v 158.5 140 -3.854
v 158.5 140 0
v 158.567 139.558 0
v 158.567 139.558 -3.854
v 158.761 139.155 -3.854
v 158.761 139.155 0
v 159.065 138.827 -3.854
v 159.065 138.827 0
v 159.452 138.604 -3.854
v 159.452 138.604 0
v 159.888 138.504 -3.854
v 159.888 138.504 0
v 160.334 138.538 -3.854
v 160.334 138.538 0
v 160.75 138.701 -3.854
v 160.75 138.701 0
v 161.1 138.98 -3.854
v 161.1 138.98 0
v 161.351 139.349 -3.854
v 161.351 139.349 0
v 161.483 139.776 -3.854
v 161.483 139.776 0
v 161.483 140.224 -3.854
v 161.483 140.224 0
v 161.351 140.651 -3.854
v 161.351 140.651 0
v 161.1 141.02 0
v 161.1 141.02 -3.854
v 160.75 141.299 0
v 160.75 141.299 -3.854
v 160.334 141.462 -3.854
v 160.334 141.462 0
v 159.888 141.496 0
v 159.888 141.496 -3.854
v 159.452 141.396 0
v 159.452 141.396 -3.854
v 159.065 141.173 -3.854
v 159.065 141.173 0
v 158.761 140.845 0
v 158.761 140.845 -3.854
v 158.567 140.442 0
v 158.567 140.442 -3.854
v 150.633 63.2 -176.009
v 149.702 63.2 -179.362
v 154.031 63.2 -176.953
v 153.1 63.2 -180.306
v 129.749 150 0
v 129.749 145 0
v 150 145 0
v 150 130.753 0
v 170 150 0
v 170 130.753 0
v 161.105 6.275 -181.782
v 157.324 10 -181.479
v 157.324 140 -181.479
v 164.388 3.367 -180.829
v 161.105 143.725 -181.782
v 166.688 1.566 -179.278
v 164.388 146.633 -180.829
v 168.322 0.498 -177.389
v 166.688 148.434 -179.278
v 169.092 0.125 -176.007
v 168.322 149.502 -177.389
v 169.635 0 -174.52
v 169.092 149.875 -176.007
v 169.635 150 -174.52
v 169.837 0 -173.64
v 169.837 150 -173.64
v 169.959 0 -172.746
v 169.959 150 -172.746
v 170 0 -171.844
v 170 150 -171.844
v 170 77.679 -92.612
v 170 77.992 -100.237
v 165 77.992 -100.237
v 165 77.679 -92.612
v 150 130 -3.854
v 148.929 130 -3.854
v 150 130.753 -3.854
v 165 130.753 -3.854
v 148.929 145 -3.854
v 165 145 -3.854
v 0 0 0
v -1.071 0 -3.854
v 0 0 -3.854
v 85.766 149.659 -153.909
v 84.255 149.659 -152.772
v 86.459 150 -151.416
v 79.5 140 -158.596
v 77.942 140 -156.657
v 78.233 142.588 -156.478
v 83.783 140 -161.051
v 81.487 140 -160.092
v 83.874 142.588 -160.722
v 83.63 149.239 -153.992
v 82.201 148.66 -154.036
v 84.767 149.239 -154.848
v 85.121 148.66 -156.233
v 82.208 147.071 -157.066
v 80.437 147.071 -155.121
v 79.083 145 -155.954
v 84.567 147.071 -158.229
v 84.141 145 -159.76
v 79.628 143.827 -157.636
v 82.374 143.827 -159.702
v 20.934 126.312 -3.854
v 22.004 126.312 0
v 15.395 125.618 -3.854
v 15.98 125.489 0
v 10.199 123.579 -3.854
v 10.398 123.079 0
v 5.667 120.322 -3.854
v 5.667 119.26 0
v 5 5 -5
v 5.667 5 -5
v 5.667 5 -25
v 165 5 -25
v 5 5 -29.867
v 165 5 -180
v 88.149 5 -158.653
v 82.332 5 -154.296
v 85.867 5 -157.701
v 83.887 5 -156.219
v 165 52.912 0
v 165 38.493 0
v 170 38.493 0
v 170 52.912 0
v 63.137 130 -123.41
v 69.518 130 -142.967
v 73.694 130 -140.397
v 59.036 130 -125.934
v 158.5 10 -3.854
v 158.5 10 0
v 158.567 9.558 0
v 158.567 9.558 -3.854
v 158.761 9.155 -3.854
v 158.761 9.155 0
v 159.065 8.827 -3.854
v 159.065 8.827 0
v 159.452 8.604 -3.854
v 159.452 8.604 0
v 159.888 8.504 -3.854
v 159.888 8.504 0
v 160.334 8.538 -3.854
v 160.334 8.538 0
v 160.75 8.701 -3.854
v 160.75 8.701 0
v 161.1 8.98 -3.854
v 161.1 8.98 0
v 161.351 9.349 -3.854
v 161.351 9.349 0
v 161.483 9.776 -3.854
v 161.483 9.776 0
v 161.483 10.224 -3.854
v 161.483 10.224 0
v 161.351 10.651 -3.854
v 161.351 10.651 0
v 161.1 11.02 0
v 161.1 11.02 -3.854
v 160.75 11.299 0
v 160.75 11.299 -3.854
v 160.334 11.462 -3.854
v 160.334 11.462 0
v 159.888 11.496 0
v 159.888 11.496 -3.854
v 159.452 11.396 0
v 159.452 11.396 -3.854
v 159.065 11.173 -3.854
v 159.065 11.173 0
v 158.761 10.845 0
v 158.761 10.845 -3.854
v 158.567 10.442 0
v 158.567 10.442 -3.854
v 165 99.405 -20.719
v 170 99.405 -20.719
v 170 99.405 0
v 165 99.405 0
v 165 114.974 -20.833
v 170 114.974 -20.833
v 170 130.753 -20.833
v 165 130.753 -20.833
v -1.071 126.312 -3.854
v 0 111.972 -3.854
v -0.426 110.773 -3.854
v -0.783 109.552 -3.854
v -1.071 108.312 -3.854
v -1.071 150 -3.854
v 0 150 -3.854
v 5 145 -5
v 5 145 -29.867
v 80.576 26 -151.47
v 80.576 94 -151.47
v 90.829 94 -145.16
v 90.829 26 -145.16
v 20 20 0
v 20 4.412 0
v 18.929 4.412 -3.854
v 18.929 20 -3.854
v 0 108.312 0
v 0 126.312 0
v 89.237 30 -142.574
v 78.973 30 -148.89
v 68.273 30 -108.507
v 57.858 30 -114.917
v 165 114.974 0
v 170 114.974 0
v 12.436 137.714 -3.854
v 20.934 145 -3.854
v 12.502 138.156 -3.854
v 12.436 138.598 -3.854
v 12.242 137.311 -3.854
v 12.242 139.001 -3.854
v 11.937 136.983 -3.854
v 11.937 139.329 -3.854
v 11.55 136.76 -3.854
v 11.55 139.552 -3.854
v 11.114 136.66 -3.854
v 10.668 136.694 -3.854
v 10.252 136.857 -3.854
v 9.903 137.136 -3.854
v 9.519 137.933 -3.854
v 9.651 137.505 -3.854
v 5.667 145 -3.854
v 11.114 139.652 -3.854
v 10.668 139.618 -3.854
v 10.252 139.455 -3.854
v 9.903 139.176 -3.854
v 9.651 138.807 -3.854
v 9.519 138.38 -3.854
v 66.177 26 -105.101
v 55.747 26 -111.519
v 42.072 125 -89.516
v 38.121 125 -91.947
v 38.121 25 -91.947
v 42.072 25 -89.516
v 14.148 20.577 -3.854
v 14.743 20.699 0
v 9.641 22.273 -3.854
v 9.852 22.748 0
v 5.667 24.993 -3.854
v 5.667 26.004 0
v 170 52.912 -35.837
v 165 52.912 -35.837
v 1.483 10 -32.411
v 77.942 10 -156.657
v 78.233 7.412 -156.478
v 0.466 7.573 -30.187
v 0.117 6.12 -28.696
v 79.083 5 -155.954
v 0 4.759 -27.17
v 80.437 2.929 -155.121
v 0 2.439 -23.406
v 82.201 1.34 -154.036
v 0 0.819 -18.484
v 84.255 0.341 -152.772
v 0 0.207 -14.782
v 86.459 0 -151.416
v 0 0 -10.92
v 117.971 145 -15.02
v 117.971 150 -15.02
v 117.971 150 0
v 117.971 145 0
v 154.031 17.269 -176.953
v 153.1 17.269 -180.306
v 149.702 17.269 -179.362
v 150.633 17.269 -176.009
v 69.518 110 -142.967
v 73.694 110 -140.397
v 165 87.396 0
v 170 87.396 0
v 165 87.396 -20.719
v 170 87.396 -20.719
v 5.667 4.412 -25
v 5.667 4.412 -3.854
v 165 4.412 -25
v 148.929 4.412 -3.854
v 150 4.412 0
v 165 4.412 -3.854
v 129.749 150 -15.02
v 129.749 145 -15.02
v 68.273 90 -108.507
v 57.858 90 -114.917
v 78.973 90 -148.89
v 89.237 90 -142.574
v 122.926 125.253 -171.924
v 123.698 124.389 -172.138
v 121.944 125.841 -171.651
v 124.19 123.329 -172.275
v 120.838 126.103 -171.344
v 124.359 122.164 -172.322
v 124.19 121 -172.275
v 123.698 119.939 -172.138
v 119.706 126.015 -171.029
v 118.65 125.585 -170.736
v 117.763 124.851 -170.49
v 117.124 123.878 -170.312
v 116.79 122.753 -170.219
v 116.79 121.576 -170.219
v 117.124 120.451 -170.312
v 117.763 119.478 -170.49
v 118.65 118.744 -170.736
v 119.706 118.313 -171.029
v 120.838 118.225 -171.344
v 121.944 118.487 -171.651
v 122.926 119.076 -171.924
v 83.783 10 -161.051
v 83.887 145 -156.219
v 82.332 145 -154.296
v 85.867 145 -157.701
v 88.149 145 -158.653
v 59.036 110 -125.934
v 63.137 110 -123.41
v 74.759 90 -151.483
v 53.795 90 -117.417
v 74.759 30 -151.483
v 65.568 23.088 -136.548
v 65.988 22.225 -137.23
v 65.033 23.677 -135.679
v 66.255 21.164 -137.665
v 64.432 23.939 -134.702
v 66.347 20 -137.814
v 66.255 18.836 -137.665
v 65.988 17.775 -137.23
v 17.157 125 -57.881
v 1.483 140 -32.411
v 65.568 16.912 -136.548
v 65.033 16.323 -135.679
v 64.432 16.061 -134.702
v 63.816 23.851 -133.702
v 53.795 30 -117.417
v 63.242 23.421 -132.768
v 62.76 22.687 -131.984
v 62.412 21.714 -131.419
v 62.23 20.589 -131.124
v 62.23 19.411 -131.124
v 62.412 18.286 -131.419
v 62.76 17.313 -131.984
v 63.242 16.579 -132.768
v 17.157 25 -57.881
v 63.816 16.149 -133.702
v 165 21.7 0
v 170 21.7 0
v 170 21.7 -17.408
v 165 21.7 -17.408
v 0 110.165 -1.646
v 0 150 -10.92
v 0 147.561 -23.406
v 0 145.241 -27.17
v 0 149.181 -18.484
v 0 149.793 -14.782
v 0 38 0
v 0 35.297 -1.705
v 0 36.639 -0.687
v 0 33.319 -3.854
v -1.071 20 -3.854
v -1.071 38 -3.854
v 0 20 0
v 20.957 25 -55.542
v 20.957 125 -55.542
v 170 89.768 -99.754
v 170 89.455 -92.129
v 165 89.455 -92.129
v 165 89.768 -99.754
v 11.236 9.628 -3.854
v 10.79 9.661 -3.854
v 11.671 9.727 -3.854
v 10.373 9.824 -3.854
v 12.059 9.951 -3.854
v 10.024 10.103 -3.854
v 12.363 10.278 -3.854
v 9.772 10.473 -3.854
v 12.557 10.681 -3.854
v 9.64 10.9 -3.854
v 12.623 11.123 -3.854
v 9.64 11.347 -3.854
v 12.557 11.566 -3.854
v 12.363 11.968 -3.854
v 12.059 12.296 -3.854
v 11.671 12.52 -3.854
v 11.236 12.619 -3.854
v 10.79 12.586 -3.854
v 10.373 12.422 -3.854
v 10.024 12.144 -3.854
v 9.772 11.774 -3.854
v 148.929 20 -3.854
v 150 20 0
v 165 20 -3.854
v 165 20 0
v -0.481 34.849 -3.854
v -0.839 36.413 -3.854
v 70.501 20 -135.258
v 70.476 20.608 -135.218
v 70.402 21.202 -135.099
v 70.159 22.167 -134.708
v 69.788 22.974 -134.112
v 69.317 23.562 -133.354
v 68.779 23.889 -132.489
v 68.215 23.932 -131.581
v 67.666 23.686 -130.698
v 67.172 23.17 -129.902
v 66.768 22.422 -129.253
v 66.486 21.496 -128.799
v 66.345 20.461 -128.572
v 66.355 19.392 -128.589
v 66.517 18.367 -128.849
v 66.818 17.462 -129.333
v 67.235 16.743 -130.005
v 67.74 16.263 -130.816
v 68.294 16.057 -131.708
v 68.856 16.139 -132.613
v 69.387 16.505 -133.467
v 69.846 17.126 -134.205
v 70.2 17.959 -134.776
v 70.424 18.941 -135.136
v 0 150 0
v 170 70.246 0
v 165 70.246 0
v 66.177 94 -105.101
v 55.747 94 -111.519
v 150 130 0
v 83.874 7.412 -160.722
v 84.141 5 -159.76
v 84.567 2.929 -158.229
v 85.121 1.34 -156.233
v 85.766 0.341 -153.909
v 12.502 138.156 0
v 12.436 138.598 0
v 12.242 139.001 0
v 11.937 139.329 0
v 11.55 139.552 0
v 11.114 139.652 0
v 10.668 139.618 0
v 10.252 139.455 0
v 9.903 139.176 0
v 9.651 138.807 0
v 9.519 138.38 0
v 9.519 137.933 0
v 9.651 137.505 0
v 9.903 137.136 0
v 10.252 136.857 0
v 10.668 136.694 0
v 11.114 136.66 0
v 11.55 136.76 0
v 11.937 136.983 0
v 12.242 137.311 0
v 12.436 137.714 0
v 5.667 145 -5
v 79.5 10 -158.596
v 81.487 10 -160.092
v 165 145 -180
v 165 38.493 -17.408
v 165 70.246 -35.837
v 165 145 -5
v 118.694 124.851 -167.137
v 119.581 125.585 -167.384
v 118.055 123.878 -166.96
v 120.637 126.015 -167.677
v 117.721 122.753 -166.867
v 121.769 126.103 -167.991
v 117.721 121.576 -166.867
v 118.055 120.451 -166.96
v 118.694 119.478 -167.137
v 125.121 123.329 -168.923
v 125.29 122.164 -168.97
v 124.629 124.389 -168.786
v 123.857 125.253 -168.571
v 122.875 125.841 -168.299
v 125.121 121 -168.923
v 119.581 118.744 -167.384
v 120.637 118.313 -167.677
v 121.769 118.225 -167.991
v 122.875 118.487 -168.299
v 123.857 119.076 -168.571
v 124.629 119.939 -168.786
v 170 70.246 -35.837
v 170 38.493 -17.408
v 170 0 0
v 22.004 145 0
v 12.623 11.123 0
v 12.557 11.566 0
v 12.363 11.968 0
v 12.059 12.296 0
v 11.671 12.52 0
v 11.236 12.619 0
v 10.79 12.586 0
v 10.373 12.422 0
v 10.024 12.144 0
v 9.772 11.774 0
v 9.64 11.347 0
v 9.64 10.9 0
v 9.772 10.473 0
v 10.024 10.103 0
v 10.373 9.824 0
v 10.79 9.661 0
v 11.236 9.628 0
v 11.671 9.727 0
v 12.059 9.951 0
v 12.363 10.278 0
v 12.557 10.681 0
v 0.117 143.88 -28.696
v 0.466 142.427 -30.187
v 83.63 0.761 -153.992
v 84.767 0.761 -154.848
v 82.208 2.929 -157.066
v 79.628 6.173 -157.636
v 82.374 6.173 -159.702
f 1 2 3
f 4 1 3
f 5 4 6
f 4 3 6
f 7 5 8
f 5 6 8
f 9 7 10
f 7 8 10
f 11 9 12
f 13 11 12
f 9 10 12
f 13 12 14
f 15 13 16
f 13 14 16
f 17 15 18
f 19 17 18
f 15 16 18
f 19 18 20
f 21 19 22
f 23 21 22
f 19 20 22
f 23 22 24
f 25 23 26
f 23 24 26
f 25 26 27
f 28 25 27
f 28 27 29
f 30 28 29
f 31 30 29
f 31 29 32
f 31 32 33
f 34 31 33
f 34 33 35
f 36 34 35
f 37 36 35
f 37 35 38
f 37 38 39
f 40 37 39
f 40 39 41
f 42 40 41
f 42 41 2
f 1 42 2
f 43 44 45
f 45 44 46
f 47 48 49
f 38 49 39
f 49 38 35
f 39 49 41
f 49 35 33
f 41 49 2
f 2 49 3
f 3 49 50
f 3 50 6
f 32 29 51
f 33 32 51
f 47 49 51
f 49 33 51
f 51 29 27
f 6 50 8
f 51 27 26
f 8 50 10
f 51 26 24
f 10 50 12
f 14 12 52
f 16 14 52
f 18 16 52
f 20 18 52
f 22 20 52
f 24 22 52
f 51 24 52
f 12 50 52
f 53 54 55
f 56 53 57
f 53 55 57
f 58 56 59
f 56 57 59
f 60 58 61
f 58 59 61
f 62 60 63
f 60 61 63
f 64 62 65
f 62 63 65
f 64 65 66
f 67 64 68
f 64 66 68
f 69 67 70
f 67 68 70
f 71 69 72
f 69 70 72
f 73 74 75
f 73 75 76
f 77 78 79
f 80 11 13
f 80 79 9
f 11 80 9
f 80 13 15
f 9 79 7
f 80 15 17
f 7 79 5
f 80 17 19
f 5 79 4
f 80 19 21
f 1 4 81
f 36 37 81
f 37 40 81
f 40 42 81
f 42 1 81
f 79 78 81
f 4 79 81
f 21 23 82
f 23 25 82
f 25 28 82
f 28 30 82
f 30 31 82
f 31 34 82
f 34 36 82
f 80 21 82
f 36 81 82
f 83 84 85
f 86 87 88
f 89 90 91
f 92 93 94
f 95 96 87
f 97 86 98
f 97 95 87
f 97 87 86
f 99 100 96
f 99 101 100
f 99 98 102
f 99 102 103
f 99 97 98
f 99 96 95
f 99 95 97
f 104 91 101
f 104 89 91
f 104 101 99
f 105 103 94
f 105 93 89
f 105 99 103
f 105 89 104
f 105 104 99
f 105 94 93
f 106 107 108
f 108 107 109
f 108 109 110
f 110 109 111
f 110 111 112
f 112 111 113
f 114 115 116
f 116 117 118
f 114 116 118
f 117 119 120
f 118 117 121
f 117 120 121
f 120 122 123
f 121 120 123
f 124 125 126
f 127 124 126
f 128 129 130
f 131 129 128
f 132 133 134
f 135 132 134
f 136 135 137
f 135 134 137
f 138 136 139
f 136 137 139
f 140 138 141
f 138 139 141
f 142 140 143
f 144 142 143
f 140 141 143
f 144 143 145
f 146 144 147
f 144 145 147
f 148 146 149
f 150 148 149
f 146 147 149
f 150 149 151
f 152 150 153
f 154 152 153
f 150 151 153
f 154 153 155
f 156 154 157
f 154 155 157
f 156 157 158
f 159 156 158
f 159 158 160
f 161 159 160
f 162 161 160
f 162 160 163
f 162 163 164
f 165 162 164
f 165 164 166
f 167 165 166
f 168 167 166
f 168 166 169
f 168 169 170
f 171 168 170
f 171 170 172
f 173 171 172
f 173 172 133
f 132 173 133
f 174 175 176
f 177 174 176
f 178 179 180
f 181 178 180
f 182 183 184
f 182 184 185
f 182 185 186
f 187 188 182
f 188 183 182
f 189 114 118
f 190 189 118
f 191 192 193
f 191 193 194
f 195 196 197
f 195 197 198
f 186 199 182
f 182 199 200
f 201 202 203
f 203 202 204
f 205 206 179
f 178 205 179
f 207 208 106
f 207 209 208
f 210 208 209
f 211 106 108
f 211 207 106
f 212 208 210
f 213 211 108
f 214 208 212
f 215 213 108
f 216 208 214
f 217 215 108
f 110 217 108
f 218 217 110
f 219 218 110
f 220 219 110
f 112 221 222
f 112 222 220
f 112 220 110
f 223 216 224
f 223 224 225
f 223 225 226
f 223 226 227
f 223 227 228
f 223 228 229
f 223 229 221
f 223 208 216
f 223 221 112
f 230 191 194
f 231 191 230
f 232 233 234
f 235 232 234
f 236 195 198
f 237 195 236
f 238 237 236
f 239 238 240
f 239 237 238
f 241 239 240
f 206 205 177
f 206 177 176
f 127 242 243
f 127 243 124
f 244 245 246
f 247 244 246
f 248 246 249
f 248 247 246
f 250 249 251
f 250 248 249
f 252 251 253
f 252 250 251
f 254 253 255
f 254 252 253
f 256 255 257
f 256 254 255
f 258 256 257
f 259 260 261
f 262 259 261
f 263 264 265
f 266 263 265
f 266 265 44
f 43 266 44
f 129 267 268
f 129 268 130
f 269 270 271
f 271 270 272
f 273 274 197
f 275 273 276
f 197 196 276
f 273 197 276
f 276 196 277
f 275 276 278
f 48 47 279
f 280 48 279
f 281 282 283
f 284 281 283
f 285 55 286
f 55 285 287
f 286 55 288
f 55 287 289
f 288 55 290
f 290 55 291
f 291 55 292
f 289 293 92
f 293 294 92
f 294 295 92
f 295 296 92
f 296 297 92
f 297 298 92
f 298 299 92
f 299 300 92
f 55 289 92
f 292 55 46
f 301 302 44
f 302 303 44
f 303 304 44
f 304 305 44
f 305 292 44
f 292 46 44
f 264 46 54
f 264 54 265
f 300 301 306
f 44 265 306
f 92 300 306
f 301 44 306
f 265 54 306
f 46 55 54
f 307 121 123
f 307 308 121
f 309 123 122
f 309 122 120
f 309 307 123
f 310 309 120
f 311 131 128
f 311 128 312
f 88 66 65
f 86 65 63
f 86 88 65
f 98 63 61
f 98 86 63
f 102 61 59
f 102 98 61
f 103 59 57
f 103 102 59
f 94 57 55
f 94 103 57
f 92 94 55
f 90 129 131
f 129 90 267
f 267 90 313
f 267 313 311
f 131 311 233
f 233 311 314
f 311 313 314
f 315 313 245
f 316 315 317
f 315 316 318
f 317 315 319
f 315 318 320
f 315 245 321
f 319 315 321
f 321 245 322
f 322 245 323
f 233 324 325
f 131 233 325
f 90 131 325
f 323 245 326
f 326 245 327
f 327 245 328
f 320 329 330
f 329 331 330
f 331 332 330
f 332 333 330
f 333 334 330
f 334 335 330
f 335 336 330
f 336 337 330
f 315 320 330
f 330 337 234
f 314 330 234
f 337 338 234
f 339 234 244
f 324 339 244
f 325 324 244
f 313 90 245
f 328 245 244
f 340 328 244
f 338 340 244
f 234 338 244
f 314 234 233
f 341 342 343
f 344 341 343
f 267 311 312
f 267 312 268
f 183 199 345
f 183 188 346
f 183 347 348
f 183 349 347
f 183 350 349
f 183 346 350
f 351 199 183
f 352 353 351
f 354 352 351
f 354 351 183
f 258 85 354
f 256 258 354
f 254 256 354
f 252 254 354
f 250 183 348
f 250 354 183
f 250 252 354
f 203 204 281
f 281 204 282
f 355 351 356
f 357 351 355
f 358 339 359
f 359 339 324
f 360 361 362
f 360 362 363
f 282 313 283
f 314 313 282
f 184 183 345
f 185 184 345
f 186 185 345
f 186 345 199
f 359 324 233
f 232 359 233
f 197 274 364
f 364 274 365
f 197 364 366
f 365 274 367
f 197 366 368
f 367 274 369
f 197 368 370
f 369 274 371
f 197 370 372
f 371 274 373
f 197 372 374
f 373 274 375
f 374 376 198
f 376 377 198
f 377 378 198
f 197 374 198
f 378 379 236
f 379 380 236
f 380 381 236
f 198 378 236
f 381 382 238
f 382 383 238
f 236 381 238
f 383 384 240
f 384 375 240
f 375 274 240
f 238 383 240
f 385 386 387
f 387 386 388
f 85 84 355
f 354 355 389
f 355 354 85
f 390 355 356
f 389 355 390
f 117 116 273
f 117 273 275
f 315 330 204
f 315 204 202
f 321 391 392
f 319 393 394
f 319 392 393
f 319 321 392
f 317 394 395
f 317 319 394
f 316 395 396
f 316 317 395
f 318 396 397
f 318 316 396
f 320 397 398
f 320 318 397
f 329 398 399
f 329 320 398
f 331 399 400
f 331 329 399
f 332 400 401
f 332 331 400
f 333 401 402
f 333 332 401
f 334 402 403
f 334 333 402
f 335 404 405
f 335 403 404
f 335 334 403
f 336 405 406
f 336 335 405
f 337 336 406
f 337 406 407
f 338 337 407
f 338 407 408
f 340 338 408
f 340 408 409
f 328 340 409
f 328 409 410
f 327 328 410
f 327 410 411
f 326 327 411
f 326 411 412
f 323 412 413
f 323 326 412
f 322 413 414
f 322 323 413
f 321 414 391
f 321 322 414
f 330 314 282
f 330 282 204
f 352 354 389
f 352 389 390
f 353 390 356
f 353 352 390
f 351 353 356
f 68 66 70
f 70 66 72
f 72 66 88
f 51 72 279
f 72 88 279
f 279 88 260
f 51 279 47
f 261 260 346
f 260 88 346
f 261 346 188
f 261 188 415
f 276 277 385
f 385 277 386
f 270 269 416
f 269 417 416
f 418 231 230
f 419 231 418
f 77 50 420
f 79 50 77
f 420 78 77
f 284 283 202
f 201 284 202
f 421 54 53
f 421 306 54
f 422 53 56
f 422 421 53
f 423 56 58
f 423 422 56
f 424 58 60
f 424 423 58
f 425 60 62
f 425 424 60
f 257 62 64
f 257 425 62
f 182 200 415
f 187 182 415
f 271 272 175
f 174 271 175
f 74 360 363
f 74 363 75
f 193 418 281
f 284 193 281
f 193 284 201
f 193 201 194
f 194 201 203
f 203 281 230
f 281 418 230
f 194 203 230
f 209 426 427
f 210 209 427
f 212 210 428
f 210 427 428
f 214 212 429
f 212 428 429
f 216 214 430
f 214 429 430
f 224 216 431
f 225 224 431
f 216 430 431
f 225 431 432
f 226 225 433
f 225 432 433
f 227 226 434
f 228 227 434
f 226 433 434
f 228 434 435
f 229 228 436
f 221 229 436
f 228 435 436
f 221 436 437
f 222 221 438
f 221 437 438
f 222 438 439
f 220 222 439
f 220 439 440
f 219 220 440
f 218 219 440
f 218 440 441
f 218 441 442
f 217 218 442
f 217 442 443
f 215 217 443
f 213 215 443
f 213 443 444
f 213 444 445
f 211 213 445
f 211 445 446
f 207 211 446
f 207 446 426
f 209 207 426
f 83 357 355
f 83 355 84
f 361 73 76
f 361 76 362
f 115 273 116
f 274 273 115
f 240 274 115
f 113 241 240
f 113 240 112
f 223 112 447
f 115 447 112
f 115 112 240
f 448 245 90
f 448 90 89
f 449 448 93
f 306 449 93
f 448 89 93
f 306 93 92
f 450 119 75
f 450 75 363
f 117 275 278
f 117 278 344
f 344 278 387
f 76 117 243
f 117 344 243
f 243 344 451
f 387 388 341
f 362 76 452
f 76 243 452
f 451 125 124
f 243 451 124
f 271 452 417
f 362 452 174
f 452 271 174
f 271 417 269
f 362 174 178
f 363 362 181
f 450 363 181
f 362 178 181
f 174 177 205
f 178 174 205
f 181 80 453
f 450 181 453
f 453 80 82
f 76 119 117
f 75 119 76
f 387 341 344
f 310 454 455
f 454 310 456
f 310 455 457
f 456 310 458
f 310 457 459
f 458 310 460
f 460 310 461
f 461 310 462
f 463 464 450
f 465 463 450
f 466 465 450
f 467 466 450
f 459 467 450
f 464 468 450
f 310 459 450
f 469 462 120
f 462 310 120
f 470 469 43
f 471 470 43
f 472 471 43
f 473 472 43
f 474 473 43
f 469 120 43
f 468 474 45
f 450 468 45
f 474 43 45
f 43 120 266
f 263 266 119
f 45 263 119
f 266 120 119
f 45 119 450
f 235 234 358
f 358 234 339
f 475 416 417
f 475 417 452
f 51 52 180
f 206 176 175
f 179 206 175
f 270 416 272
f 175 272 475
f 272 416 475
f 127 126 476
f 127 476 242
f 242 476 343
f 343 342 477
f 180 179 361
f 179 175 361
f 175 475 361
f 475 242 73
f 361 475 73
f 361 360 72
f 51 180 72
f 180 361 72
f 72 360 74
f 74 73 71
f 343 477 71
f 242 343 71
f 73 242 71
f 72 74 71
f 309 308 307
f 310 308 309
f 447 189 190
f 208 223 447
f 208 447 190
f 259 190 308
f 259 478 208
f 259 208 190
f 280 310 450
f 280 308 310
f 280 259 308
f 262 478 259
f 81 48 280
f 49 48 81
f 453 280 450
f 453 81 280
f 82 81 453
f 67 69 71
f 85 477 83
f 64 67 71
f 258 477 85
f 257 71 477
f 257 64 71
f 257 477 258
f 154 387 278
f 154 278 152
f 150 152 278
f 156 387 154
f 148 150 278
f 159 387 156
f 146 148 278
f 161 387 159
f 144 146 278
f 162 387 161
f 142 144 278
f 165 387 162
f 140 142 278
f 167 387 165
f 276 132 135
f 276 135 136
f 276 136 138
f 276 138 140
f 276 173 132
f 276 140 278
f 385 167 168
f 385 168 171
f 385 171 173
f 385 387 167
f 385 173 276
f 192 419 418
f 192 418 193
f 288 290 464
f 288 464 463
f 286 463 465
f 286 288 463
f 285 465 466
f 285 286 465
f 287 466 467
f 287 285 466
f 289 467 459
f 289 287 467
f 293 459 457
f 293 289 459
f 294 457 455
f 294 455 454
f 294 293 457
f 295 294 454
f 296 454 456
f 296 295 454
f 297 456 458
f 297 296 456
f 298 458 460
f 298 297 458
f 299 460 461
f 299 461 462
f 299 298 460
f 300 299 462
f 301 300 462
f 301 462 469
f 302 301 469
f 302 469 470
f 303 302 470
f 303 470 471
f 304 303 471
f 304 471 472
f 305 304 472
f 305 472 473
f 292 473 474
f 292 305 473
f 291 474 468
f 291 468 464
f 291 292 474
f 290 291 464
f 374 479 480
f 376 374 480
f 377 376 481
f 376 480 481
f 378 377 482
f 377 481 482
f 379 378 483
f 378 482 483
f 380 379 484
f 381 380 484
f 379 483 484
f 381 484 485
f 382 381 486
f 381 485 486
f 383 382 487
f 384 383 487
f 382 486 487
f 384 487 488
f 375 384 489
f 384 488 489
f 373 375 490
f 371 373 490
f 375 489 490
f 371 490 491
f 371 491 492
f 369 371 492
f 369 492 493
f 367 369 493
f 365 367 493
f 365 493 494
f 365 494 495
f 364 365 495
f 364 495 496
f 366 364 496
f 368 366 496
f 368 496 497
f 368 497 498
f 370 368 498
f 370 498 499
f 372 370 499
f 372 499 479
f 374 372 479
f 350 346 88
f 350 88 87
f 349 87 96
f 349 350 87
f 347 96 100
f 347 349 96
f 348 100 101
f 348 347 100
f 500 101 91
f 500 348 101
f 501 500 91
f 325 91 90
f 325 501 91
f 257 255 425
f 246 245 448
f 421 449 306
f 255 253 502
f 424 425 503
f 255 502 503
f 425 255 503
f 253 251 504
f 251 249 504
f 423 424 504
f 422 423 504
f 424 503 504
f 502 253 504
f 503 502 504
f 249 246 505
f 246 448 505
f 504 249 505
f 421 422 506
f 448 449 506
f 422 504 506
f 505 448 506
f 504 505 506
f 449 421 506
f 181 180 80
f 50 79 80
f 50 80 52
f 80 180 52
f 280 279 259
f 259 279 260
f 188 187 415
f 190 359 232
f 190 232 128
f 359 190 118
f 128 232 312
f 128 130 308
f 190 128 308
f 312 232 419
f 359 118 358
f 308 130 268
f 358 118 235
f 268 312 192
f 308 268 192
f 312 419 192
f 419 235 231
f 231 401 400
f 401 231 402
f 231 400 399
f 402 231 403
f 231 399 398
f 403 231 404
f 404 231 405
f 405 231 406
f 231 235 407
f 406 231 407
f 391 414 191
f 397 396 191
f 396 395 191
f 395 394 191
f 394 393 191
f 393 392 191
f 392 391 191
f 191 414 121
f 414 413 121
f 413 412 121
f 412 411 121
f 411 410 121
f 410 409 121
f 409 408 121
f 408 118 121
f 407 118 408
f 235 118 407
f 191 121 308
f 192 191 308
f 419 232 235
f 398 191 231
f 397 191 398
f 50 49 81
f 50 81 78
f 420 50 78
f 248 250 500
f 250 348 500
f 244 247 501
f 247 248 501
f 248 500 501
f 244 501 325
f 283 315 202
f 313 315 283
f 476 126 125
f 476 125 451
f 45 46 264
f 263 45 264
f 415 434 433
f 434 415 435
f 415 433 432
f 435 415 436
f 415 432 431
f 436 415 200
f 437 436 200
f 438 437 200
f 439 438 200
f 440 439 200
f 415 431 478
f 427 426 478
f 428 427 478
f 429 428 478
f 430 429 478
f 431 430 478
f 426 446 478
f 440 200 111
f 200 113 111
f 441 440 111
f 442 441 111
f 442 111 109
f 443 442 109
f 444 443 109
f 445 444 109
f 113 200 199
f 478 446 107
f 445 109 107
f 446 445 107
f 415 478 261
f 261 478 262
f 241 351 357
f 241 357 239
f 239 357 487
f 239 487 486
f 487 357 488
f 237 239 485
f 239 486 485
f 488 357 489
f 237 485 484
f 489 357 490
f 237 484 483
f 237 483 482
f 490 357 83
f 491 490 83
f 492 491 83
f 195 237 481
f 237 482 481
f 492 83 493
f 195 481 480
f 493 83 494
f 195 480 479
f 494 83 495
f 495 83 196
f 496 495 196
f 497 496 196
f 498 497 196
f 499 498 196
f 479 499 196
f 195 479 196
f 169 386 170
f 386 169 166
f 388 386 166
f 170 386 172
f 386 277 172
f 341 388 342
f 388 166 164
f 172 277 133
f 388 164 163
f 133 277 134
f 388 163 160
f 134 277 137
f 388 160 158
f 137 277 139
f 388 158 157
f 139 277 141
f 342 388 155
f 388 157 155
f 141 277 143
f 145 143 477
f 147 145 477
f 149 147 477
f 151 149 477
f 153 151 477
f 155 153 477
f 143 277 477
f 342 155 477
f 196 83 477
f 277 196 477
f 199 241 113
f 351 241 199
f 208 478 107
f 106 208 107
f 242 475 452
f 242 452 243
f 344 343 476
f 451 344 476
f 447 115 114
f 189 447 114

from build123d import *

# Parameters (mm, degrees)
ESBO_O1_W                  = 170
ESBO_O1_H                  = 30
RESSALTO_EXTRUS_O1_DEPTH   = 150
CORTE_EXTRUS_O1_DEPTH      = 222
CORTE_EXTRUS_O1_DEPTH_BACK = 36
RESSALTO_EXTRUS_O2_DEPTH   = 5
RESSALTO_EXTRUS_O3_DEPTH   = 5
ESBO_O4_W                  = 159.333333333
ESBO_O4_H                  = 140.588235294
CORTE_EXTRUS_O2_DEPTH      = 25
CORTE_EXTRUS_O3_DEPTH      = 31
CORTE_EXTRUS_O4_DEPTH      = 42
FILETE1_R                  = 10
CORTE_EXTRUS_O5_DEPTH      = 32
CORTE_EXTRUS_O6_START      = -15.72292277
CORTE_EXTRUS_O6_OUTLINE_R  = 3.95
CORTE_EXTRUS_O6_DEPTH      = 4.876648775
CORTE_EXTRUS_O7_START      = -132.751356438
CORTE_EXTRUS_O7_OUTLINE_R  = 3.95
CORTE_EXTRUS_O7_DEPTH      = 3.479370229
RESSALTO_EXTRUS_O6_DEPTH   = 17
RESSALTO_EXTRUS_O7_DEPTH   = 4
CORTE_EXTRUS_O8_DEPTH      = 21
F_3DSKETCH12_R             = 1.5
CORTE_EXTRUS_O9_DEPTH      = 14
CORTE_EXTRUS_O10_DEPTH     = 19
ESBO_O11_W                 = 17.407525744
ESBO_O11_H                 = 16.792397695
CORTE_EXTRUS_O11_DEPTH     = 10
CORTE_EXTRUS_O12_DEPTH     = 20
CORTE_EXTRUS_O13_DEPTH     = 14


# Read off the part's stored shape, not the designer's step: Corte-extrusão6, Corte-extrusão7
with BuildPart() as part:
    # Esboço1 → Ressalto-extrusão1 (new body)
    with BuildSketch(Plane(origin=(0, 0, 0), x_dir=(1, 0, 0), z_dir=(0, 1, 0))):
        with Locations((85, 15)):
            Rectangle(ESBO_O1_W, ESBO_O1_H)
        Polygon((80, 160), (0, 30), (170, 30), (170, 160), align=None)
        Polygon((170, 160), (170, 185), (80, 160), align=None)
    extrude(amount=RESSALTO_EXTRUS_O1_DEPTH)

    # Esboço2 → Corte-extrusão1 (cut, two sides: drawn at the far end of the back side and taken through both)
    with BuildSketch(Plane(origin=(0, 0, 0), x_dir=(1, 0, 0), z_dir=(0, 1, 0)).offset(-CORTE_EXTRUS_O1_DEPTH_BACK)):
        Polygon((84.391050739, 157.608625205), (165, 180), (165, 5), (5, 5), (5, 29.866892941), align=None)
    extrude(amount=CORTE_EXTRUS_O1_DEPTH + CORTE_EXTRUS_O1_DEPTH_BACK, mode=Mode.SUBTRACT)

    # Esboço3 → Ressalto-extrusão2 (add)
    with BuildSketch(Plane(origin=(0, 0, 0), x_dir=(1, 0, 0), z_dir=(0, 1, 0))):
        Polygon((84.391050739, 157.608625205), (165, 180), (165, 5), (5, 5), (5, 29.866892941), align=None)
    extrude(amount=RESSALTO_EXTRUS_O2_DEPTH)

    # 3DSketch2 → Ressalto-extrusão3 (add)
    with BuildSketch(Plane(origin=(165, 150, -5), x_dir=(0, 0, -1), z_dir=(0, 1, 0))):
        Polygon((0, 0), (0, 160), (24.866892941, 160), (152.608625205, 80.608949261), (175, 0), align=None)
    extrude(amount=-RESSALTO_EXTRUS_O3_DEPTH)

    # Esboço4 → Corte-extrusão2 (cut)
    with BuildSketch(Plane.XY):
        with Locations((85.333333333, 74.705882353)):
            Rectangle(ESBO_O4_W, ESBO_O4_H)
    extrude(amount=-CORTE_EXTRUS_O2_DEPTH, mode=Mode.SUBTRACT)

    # 3DSketch3 → Corte-extrusão3 (cut)
    with BuildSketch(Plane(origin=(74.759025743, 90, -151.483416833), x_dir=(-0.29071694485714406, -0.8320502943378435, 0.4724150353928592), z_dir=(-0.8516583167045438, 0, -0.5240974256643346))):
        Polygon((0, 0), (22.188007849, 33.282011774), (72.111025509, 0), (49.92301766, -33.282011774), align=None)
    extrude(amount=-CORTE_EXTRUS_O3_DEPTH, mode=Mode.SUBTRACT)

    # 3DSketch4 → Corte-extrusão4 (cut)
    with BuildSketch(Plane(origin=(69.518051487, 130, -142.966833666), x_dir=(-0.37059284368967266, -0.7071067811865471, 0.6022133709956982), z_dir=(0.8516583167045362, 0, 0.5240974256643472))):
        Polygon((0, 0), (14.142135624, -14.142135624), (28.284271247, 0), (14.142135624, 14.142135624), align=None)
    extrude(amount=CORTE_EXTRUS_O4_DEPTH, mode=Mode.SUBTRACT)

    # Filete1
    filete1_edges = [part.edges().sort_by_distance(p)[0] for p in [
        (170, 75, -185),
        (125, 0, -172.5),
        (125, 150, -172.5),
        (80, 75, -160),
        (40, 0, -95),
        (40, 150, -95),
        (0, 75, -30),
        (84.391050739, 75, -157.608625205),
    ]]
    fillet(filete1_edges, radius=FILETE1_R)

    # 3DSketch5 → Corte-extrusão5 (cut)
    with BuildSketch(Plane(origin=(38.121221288, 25, -91.946984593), x_dir=(-0.194644897392922, 0.9284766908852593, 0.31629795826349816), z_dir=(0.851658316704544, 0, 0.5240974256643347))):
        Polygon((0, 0), (14.855627054, 37.139067635), (107.703296143, 0), (92.847669089, -37.139067635), align=None)
    extrude(amount=CORTE_EXTRUS_O5_DEPTH, mode=Mode.SUBTRACT)

    # Corte-extrusão6 outline → Corte-extrusão6 (cut)
    with BuildSketch(Plane(origin=(0, 0, 0), x_dir=(0.5240974256643349, 0, -0.8516583167045437), z_dir=(0.8516583167045437, 0, 0.5240974256643349)).offset(CORTE_EXTRUS_O6_START)):
        with Locations((148.193124726, 20)):
            Circle(CORTE_EXTRUS_O6_OUTLINE_R)
    extrude(amount=CORTE_EXTRUS_O6_DEPTH, mode=Mode.SUBTRACT)

    # Corte-extrusão7 outline → Corte-extrusão7 (cut)
    with BuildSketch(Plane(origin=(0, 0, 0), x_dir=(0.9635179096299408, 0, -0.267643863786094), z_dir=(0.267643863786094, 0, 0.9635179096299409)).offset(CORTE_EXTRUS_O7_START)):
        with Locations((161.993020775, 122.164347625)):
            Circle(CORTE_EXTRUS_O7_OUTLINE_R)
    extrude(amount=CORTE_EXTRUS_O7_DEPTH, mode=Mode.SUBTRACT)

    # 3DSketch9 → Ressalto-extrusão6 (add)
    with BuildSketch(Plane(origin=(76.350750718, 26, -154.069969916), x_dir=(-0.29815073011621673, 0.8224176546598938, 0.4844949364388514), z_dir=(0.8516583167045438, 0, 0.5240974256643349))):
        Polygon((0, 0), (26.758649409, 38.684123705), (82.683049926, 0), (55.924400517, -38.684123705), align=None)
        Polygon((5.017416454, 0.222210211), (27.772783339, 33.118916398), (77.117842619, -1.01413393), (54.362475733, -33.910840117), align=None, mode=Mode.SUBTRACT)
    extrude(amount=RESSALTO_EXTRUS_O6_DEPTH)

    # 3DSketch10 → Ressalto-extrusão7 (add, along a direction that is not the sketch's normal)
    with BuildSketch(Plane(origin=(0, 0, 0), x_dir=(0.7498378553650926, 0.6616216370868463, 0), z_dir=(0, 0, 1))):
        with BuildLine():
            Line((0, 0), (14.996757107, -13.232432742))
            Line((14.996757107, -13.232432742), (28.229189849, 1.764324366))
            ThreePointArc((28.229189849, 1.764324366), (21.556867541, 14.536675999), (25.141622209, 28.493838504))
            Line((25.141622209, 28.493838504), (13.232432742, 14.996757107))
            Line((13.232432742, 14.996757107), (0, 0))
        make_face()
        with BuildLine():
            Line((99.243245563, 112.475678305), (115.742930564, 97.917132715))
            Line((115.742930564, 97.917132715), (100.070543679, 80.155094246))
            ThreePointArc((100.070543679, 80.155094246), (86.055529464, 85.755516688), (71.66166921, 81.216558438))
            Line((71.66166921, 81.216558438), (83.570858678, 94.713639835))
            Line((83.570858678, 94.713639835), (99.243245563, 112.475678305))
        make_face()
        Polygon((226.715680975, 0), (211.718923868, 13.232432742), (198.486491126, -1.764324366), (213.483248233, -14.996757107), align=None)
        Polygon((127.472435412, -112.475678305), (112.475678305, -99.243245563), (125.708111047, -84.246488456), (140.704868154, -97.478921197), align=None)
    extrude(amount=-RESSALTO_EXTRUS_O7_DEPTH, dir=(0.26764386378609445, 0, 0.9635179096299407))

    # 3DSketch11 → Corte-extrusão8 (cut)
    with BuildSketch(Plane(origin=(153.100052242, 17.26943239, -180.305570067), x_dir=(-0.07376023038027929, 0.9970655099962036, 0.02048895288341091), z_dir=(0.2676438637860946, 0, 0.9635179096299407))):
        Polygon((0, 0), (0.269964353, 3.516152018), (46.066103253, 0), (45.7961389, -3.516152018), align=None)
    extrude(amount=CORTE_EXTRUS_O8_DEPTH, mode=Mode.SUBTRACT)

    # 3DSketch12 → Corte-extrusão9 (cut)
    with BuildSketch(Plane(origin=(160, 140, 0), x_dir=(-0.7560654573770964, -0.6544960077503622, 0), z_dir=(0, 0, 1))):
        with Locations(Location((0, 0, 0), (0, 0, 319.118554366))):
            Circle(F_3DSKETCH12_R)
        with Locations(Location((85.084481008, 98.288509459, 0), (0, 0, 319.118554366))):
            Circle(F_3DSKETCH12_R)
        with Locations(Location((113.858951537, -96.124361942, 0), (0, 0, 139.118554366))):
            Circle(F_3DSKETCH12_R)
        with Locations(Location((196.909602971, 0, 0), (0, 0, 139.118554366))):
            Circle(F_3DSKETCH12_R)
    extrude(amount=-CORTE_EXTRUS_O9_DEPTH, mode=Mode.SUBTRACT)

    # 3DSketch13 → Corte-extrusão10 (cut)
    with BuildSketch(Plane(origin=(170, 70.245878967, 0), x_dir=(0, -0.4354246522459521, -0.9002251786172678), z_dir=(-1, 0, 0))):
        Polygon((0, 0), (32.261446294, -15.604350297), (39.809023237, 0), (7.547576943, 15.604350297), align=None)
    extrude(amount=CORTE_EXTRUS_O10_DEPTH, mode=Mode.SUBTRACT)

    # Esboço11 → Corte-extrusão11 (cut)
    with BuildSketch(Plane(origin=(170, 0, 0), x_dir=(0, 0, -1), z_dir=(1, 0, 0))):
        with Locations((8.703762872, 30.096304842)):
            Rectangle(ESBO_O11_W, ESBO_O11_H)
    extrude(amount=-CORTE_EXTRUS_O11_DEPTH, mode=Mode.SUBTRACT)

    # 3DSketch14 → Corte-extrusão12 (cut)
    with BuildSketch(Plane(origin=(170, 87.396079578, 0), x_dir=(0, -0.09341146144778735, -0.9956275904524686), z_dir=(1, 0, 0))):
        Polygon((0, 0), (20.627912038, 1.935345533), (19.506160301, 13.891554783), (-1.121751737, 11.956209249), align=None)
        Polygon((-2.576084268, 27.457236328), (18.165947056, 29.403288726), (16.691971594, 45.113680317), (-4.050059731, 43.167627919), align=None)
        Polygon((91.534016736, 10.656116635), (99.096194716, 11.679615344), (100.676965661, 0), (93.114787682, -1.02349871), align=None)
    extrude(amount=-CORTE_EXTRUS_O12_DEPTH, mode=Mode.SUBTRACT)

    # 3DSketch15 → Corte-extrusão13 (cut)
    with BuildSketch(Plane(origin=(129.748977416, 150, 0), x_dir=(-0.6170578351280018, 0, -0.7869178026370631), z_dir=(0, -1, 0))):
        Polygon((0, 0), (11.819817446, 9.268453377), (19.087630878, 0), (7.267813432, -9.268453377), align=None)
    extrude(amount=CORTE_EXTRUS_O13_DEPTH, mode=Mode.SUBTRACT)


solid = part.part
